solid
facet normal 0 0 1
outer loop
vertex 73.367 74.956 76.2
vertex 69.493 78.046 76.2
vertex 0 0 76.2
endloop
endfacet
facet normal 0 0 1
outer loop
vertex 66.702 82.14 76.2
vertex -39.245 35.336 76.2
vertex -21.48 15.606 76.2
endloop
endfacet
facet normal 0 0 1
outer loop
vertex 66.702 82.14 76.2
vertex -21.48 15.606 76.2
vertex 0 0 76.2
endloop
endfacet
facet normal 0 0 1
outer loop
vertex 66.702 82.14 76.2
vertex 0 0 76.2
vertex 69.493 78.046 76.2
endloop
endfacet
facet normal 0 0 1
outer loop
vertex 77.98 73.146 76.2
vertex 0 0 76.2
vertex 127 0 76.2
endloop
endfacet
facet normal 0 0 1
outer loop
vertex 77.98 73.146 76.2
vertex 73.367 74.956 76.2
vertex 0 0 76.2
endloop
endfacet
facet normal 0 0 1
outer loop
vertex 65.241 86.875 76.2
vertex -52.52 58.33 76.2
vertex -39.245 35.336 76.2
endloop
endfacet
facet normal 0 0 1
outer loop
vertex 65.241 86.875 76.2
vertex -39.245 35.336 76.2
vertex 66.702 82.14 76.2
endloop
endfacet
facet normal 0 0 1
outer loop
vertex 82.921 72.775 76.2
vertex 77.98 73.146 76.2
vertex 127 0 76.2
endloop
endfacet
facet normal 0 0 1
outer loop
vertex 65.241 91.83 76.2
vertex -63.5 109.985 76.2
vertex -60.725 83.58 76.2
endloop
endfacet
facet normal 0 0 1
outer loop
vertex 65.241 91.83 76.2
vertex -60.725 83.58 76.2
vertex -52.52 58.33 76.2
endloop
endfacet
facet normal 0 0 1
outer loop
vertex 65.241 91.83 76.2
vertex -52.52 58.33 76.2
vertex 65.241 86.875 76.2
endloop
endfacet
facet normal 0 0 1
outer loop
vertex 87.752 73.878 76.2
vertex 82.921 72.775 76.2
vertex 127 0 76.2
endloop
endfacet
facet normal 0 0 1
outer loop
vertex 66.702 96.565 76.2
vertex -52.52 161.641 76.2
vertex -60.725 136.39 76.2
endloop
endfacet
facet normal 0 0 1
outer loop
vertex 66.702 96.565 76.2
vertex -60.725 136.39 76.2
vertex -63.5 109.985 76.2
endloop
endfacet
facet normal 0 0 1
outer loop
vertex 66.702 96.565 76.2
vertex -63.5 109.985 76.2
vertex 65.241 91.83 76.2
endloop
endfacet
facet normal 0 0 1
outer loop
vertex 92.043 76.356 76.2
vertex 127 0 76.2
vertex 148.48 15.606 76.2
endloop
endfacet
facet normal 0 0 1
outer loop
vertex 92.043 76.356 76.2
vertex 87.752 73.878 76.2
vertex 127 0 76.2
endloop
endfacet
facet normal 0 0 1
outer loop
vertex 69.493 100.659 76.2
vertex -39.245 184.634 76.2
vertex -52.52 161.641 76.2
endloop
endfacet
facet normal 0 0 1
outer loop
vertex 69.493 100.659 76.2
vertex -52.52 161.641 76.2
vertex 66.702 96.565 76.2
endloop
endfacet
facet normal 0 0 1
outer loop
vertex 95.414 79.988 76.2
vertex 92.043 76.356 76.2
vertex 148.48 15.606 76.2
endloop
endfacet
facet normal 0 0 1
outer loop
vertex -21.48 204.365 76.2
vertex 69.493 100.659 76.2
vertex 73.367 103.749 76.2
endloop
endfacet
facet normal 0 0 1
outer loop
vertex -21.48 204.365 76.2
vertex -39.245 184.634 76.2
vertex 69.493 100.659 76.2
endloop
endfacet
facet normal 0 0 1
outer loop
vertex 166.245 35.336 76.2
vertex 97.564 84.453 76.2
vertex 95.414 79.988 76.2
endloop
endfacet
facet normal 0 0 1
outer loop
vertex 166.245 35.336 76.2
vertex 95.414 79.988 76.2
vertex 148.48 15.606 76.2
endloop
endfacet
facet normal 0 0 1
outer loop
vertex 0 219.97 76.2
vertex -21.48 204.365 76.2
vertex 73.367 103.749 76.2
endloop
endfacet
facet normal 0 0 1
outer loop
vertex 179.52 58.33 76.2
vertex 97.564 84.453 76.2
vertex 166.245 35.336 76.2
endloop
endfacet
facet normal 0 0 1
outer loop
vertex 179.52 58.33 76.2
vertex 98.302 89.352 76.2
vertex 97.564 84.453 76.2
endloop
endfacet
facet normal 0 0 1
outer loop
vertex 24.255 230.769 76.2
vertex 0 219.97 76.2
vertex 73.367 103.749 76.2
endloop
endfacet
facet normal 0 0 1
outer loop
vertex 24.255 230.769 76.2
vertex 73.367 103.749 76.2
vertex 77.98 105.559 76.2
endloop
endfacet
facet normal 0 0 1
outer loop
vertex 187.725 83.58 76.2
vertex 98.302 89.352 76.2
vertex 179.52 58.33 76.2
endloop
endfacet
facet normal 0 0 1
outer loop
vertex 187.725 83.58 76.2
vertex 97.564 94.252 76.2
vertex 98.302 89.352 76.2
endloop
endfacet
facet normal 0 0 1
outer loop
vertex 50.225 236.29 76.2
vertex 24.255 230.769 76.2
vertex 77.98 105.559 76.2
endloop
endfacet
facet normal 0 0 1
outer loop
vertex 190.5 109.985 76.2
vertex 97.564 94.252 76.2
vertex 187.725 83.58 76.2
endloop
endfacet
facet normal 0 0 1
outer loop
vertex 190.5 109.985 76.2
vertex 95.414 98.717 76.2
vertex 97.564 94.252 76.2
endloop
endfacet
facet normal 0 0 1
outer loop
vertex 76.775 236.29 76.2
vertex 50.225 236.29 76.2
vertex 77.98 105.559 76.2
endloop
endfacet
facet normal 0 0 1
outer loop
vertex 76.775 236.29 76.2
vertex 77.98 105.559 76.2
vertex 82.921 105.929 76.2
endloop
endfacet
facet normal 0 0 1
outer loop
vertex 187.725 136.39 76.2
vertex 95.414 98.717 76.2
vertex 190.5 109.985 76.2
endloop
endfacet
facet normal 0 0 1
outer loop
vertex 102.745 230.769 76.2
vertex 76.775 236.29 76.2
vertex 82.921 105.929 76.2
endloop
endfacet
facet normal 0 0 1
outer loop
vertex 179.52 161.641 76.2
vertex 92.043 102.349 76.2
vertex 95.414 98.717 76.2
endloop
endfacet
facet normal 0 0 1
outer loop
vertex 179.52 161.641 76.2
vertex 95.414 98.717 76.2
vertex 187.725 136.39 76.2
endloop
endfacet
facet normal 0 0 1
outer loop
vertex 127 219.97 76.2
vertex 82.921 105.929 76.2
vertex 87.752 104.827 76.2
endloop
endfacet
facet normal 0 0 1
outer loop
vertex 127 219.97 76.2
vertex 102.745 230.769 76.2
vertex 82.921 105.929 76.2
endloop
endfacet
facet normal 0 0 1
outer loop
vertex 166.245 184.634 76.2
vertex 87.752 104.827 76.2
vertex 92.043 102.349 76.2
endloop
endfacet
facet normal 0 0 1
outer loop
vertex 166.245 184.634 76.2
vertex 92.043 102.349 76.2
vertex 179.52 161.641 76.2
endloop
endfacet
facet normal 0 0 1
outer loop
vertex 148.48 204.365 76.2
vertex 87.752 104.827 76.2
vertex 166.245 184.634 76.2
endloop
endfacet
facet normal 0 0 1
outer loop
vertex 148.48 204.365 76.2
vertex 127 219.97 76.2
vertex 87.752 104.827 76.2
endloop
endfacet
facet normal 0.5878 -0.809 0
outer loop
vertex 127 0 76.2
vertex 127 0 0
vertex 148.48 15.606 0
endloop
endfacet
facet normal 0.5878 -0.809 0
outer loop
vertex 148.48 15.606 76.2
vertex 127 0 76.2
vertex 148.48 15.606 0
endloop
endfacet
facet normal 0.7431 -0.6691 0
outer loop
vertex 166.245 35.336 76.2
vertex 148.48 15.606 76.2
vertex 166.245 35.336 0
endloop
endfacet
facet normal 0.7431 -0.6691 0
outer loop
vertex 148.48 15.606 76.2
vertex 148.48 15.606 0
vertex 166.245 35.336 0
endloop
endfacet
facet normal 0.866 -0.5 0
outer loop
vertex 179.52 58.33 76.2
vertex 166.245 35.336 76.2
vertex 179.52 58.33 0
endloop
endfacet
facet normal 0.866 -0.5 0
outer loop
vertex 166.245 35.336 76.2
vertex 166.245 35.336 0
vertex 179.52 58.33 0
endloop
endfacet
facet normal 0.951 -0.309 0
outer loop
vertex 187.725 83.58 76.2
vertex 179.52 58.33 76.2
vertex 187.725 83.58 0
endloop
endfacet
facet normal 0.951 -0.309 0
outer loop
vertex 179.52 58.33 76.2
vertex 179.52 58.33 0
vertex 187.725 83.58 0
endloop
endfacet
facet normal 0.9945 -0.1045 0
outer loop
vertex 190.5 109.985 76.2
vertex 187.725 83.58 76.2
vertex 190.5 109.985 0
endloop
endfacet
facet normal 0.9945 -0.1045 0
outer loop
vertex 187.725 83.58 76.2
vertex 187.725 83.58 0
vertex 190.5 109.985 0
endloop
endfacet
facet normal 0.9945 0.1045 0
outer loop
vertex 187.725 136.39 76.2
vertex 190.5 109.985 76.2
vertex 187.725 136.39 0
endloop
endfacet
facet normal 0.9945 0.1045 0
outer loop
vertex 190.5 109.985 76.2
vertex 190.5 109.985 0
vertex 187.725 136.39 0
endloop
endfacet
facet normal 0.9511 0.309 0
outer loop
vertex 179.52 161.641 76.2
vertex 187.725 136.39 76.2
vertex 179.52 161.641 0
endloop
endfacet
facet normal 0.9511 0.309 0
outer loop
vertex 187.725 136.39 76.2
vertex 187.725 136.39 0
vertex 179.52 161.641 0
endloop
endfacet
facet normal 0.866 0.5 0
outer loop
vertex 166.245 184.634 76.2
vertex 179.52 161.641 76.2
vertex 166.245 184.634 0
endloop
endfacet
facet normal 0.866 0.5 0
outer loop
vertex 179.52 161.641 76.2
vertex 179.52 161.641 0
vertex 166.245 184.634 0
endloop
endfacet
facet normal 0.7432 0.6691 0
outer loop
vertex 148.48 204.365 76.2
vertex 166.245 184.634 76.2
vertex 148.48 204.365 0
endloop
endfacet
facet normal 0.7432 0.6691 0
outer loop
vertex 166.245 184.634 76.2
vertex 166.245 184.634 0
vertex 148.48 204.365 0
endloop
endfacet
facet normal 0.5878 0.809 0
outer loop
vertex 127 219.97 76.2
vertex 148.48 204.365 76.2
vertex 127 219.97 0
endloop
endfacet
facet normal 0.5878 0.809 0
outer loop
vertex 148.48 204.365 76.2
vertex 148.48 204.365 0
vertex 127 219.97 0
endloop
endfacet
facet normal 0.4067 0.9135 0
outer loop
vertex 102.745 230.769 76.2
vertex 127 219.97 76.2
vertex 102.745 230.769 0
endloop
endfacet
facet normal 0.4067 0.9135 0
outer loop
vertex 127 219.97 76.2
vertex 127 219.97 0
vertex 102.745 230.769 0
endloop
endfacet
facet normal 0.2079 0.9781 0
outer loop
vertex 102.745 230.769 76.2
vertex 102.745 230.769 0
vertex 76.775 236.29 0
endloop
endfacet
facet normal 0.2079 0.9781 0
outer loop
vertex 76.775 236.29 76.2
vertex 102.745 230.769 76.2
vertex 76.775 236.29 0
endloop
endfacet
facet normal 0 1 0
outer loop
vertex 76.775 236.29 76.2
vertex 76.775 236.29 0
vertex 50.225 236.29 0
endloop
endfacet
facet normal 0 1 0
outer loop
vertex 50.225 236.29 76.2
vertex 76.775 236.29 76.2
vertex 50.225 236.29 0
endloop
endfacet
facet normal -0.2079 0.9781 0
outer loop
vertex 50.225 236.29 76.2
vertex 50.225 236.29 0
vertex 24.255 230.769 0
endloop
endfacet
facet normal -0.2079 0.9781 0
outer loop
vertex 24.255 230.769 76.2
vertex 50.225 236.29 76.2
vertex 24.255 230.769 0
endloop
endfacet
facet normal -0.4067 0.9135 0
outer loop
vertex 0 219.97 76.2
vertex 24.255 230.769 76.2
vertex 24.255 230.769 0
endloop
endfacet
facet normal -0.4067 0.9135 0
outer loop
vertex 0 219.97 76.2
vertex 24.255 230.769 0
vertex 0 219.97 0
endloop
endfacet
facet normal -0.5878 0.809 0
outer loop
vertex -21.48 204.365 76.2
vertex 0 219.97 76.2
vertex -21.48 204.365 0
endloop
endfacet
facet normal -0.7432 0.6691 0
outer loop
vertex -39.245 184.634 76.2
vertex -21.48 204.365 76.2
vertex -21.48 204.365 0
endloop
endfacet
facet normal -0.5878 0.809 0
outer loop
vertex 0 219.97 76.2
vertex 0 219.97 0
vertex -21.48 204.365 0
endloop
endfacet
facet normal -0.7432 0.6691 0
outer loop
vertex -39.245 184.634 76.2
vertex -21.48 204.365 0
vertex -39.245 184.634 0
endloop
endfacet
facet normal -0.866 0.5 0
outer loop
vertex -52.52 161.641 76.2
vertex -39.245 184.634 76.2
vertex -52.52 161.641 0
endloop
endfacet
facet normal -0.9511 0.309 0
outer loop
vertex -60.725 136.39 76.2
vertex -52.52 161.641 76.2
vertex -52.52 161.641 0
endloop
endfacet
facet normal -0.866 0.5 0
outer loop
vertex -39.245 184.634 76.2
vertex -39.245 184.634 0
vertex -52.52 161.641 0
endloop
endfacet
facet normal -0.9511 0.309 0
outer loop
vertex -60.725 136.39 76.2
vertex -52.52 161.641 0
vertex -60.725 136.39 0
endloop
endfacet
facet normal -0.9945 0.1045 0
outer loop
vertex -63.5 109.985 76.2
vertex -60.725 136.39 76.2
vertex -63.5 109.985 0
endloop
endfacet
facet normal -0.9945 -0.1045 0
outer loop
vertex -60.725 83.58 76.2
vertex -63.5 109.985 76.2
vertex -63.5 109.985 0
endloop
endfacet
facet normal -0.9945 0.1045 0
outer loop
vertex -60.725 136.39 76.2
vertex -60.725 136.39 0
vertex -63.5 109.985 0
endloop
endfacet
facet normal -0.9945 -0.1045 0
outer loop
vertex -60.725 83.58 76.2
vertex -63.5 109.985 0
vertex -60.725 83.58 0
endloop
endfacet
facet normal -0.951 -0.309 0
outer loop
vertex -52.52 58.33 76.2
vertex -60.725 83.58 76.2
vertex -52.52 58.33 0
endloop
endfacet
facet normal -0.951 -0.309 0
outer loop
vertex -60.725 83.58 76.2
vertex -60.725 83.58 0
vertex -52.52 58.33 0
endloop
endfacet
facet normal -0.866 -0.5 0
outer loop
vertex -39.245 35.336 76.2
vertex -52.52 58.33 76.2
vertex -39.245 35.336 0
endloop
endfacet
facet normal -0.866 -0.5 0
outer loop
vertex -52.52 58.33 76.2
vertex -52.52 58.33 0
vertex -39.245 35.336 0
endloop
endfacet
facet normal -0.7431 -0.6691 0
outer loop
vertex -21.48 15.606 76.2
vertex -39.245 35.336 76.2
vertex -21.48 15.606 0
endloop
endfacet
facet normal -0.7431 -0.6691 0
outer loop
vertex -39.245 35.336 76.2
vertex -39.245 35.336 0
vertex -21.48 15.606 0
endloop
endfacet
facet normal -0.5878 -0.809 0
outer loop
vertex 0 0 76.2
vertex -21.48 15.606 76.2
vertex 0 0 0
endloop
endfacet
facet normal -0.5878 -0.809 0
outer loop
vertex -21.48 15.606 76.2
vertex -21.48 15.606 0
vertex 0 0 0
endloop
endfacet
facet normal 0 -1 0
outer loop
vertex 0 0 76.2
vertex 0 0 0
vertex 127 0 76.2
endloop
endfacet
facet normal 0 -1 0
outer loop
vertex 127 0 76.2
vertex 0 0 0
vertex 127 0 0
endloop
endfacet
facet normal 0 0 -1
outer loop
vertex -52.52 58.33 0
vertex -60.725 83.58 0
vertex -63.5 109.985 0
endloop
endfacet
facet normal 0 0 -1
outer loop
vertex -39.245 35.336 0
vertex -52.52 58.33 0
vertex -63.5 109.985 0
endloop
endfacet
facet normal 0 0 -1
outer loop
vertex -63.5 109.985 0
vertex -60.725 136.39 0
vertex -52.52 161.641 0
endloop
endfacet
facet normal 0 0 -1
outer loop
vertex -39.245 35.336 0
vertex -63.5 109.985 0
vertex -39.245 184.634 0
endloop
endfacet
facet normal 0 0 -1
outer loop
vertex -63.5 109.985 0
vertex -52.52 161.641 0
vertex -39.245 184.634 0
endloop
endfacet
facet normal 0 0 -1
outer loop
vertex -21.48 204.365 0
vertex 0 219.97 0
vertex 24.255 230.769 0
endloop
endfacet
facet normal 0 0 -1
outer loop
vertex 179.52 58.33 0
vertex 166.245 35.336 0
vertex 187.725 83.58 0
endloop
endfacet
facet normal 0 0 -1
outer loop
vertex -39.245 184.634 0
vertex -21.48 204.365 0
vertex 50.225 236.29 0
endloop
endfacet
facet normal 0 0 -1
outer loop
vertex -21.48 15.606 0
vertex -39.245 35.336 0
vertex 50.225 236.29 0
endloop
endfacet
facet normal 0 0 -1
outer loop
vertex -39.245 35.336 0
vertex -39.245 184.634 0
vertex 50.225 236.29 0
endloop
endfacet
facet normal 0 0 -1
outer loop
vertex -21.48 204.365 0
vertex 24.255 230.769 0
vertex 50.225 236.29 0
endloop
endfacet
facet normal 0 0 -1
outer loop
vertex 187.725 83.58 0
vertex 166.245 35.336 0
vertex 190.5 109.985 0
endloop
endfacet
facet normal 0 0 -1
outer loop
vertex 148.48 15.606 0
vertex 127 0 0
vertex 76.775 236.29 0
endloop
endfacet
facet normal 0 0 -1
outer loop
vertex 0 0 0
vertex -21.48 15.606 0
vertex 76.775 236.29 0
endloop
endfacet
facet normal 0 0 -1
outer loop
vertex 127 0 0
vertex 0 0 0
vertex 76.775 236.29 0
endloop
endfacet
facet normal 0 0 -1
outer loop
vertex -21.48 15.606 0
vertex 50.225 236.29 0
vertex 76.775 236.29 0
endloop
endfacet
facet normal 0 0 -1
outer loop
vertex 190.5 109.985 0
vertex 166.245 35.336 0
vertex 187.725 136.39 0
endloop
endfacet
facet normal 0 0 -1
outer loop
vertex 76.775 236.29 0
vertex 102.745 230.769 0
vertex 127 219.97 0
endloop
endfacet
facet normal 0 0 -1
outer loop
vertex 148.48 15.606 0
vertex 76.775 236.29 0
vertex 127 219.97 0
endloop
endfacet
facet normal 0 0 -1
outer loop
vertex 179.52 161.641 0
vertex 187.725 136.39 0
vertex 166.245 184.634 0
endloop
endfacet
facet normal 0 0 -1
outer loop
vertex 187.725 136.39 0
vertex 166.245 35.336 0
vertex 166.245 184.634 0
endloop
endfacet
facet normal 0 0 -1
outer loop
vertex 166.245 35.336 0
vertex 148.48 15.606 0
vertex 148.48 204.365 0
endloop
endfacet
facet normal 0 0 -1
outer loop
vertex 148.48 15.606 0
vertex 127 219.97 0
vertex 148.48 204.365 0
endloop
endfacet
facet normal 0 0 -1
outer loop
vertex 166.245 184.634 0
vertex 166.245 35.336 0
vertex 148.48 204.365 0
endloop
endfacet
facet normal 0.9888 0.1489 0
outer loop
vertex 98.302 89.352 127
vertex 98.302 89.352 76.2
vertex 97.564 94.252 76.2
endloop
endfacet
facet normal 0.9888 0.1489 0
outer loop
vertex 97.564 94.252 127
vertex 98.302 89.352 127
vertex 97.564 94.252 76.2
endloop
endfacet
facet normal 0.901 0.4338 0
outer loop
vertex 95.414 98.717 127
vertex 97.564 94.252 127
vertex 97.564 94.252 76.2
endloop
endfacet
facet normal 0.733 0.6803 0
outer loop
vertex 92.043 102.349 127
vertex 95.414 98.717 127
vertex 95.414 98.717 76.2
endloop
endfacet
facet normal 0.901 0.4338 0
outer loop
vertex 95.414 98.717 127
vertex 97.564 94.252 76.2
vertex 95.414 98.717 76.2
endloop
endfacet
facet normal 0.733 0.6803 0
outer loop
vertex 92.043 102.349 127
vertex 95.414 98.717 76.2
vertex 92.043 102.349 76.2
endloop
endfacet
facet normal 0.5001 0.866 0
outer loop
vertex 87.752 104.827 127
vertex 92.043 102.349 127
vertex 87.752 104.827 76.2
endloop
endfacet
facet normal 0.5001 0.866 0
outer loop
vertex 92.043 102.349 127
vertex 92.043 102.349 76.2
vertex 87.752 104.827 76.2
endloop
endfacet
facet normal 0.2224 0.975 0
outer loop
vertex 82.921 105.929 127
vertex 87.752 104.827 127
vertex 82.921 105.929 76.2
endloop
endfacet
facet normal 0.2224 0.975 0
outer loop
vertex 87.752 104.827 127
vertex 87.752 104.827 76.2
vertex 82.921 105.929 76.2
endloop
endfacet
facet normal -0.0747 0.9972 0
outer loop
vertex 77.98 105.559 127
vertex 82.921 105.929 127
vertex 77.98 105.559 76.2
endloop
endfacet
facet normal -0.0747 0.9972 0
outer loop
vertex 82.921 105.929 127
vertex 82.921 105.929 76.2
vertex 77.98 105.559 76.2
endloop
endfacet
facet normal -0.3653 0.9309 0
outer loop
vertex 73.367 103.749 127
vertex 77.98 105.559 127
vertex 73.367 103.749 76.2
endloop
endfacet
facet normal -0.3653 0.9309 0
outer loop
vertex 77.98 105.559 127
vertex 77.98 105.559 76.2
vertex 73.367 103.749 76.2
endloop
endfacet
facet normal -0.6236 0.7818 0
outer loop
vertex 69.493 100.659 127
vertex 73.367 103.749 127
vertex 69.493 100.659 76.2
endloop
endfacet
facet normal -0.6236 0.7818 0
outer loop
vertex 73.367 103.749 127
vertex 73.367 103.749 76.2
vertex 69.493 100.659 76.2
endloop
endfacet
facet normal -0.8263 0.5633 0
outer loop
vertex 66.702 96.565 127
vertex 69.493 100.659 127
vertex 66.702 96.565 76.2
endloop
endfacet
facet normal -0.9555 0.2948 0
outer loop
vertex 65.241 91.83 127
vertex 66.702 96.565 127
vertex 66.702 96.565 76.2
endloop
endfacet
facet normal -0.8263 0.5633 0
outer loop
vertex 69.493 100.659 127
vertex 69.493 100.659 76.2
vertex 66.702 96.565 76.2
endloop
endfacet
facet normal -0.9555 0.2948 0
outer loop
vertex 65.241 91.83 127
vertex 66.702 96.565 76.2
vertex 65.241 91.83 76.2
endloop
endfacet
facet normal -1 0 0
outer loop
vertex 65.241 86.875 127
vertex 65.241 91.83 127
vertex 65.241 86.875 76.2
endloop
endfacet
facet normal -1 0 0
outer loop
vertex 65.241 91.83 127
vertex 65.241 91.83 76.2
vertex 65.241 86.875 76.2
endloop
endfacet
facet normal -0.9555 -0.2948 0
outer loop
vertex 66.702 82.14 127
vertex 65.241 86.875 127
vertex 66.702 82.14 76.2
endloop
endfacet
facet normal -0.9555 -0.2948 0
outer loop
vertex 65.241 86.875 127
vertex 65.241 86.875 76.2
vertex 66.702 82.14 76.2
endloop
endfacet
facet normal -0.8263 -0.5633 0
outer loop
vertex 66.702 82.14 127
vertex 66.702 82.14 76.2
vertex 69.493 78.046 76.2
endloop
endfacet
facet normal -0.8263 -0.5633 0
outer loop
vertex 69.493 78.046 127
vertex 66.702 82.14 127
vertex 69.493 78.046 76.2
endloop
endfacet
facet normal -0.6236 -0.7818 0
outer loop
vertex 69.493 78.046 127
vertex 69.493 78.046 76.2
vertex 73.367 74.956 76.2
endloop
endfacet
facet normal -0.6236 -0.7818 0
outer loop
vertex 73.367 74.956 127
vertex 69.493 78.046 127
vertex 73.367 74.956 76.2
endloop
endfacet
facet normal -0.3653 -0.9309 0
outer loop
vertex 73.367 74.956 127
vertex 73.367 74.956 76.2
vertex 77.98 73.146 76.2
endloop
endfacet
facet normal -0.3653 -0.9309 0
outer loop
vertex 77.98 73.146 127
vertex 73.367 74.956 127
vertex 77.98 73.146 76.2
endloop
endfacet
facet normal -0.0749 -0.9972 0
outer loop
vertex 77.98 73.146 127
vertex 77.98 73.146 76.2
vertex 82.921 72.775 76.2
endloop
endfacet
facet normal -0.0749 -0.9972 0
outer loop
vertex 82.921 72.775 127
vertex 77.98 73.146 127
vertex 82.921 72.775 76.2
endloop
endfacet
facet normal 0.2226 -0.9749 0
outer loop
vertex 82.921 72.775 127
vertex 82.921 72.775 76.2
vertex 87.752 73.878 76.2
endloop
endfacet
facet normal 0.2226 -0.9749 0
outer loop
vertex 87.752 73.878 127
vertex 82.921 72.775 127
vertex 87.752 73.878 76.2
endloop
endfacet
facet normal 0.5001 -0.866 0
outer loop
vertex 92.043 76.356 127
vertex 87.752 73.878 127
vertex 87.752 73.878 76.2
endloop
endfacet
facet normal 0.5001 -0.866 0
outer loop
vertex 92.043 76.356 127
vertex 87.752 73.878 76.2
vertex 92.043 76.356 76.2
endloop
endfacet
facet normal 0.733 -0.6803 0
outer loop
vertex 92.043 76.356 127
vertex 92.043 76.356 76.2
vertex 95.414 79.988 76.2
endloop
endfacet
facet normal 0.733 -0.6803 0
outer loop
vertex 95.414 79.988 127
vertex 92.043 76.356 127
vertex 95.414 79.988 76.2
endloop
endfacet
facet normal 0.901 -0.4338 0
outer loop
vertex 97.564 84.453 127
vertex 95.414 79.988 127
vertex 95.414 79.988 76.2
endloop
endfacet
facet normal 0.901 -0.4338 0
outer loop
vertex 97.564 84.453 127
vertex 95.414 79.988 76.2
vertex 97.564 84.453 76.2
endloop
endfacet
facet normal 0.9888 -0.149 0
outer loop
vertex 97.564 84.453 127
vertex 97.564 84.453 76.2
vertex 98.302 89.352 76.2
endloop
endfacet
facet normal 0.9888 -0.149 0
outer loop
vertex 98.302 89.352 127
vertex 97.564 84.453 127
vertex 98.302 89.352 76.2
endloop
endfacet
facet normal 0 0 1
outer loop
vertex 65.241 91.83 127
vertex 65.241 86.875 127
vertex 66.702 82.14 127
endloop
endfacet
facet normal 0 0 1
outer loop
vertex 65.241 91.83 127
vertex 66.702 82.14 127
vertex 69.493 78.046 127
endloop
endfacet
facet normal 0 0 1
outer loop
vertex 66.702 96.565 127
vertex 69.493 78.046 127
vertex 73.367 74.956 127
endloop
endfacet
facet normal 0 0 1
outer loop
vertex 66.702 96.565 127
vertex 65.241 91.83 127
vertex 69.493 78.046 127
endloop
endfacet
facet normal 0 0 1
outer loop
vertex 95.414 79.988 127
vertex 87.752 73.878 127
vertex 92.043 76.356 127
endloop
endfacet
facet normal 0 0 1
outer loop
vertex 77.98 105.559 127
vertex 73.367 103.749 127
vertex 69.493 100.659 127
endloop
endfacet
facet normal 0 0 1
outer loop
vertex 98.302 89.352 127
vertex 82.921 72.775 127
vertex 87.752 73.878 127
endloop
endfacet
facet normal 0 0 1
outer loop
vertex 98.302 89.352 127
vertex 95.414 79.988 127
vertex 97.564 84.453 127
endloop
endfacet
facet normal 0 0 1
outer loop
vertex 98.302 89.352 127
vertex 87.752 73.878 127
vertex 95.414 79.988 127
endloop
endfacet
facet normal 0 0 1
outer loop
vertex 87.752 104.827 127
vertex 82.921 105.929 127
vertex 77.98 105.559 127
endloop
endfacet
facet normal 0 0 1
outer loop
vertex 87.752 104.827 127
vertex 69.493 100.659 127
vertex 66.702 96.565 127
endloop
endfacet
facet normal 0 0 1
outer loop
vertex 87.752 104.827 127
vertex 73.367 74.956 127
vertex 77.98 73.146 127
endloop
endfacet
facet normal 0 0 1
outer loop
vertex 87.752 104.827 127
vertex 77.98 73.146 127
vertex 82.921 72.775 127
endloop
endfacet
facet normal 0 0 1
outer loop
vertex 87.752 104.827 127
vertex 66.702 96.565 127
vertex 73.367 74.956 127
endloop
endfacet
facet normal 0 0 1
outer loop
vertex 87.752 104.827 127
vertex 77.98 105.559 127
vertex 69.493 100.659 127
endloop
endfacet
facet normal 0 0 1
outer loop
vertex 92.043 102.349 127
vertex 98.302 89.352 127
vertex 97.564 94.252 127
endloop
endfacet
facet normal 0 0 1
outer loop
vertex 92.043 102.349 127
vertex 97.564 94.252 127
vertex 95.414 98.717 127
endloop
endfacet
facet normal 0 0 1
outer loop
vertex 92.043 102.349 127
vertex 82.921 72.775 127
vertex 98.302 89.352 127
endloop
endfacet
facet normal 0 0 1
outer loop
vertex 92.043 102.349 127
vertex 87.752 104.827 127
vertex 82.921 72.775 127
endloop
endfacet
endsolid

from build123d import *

# Parameters (mm, degrees)
F0_R     = 16.623406
F1_DEPTH = 127
F0_R_2   = 59.47353
F2_DEPTH = 76.2
F3_DEPTH = 76.2


with BuildPart() as f1:
    # F0 (on Top) → F1 (new body)
    with BuildSketch(Plane.XY):
        with Locations((81.678741, 89.352399)):
            Circle(F0_R)
    extrude(amount=F1_DEPTH)

    # F0 (on Top) → F2 (join)
    with BuildSketch(Plane.XY):
        with Locations((63.5, 109.985226)):
            Circle(F0_R_2)
        with Locations((81.678741, 89.352399)):
            Circle(F0_R, mode=Mode.SUBTRACT)
    extrude(amount=F2_DEPTH)

    # F0 (on Top) → F3 (join)
    with BuildSketch(Plane.XY):
        with BuildLine():
            ThreePointArc((127, 0), (63.5, 236.985226), (0, 0))
            Line((0, 0), (127, 0))
        make_face()
        with Locations((63.5, 109.985226)):
            Circle(F0_R_2, mode=Mode.SUBTRACT)
    extrude(amount=F3_DEPTH)


solid = f1.part
